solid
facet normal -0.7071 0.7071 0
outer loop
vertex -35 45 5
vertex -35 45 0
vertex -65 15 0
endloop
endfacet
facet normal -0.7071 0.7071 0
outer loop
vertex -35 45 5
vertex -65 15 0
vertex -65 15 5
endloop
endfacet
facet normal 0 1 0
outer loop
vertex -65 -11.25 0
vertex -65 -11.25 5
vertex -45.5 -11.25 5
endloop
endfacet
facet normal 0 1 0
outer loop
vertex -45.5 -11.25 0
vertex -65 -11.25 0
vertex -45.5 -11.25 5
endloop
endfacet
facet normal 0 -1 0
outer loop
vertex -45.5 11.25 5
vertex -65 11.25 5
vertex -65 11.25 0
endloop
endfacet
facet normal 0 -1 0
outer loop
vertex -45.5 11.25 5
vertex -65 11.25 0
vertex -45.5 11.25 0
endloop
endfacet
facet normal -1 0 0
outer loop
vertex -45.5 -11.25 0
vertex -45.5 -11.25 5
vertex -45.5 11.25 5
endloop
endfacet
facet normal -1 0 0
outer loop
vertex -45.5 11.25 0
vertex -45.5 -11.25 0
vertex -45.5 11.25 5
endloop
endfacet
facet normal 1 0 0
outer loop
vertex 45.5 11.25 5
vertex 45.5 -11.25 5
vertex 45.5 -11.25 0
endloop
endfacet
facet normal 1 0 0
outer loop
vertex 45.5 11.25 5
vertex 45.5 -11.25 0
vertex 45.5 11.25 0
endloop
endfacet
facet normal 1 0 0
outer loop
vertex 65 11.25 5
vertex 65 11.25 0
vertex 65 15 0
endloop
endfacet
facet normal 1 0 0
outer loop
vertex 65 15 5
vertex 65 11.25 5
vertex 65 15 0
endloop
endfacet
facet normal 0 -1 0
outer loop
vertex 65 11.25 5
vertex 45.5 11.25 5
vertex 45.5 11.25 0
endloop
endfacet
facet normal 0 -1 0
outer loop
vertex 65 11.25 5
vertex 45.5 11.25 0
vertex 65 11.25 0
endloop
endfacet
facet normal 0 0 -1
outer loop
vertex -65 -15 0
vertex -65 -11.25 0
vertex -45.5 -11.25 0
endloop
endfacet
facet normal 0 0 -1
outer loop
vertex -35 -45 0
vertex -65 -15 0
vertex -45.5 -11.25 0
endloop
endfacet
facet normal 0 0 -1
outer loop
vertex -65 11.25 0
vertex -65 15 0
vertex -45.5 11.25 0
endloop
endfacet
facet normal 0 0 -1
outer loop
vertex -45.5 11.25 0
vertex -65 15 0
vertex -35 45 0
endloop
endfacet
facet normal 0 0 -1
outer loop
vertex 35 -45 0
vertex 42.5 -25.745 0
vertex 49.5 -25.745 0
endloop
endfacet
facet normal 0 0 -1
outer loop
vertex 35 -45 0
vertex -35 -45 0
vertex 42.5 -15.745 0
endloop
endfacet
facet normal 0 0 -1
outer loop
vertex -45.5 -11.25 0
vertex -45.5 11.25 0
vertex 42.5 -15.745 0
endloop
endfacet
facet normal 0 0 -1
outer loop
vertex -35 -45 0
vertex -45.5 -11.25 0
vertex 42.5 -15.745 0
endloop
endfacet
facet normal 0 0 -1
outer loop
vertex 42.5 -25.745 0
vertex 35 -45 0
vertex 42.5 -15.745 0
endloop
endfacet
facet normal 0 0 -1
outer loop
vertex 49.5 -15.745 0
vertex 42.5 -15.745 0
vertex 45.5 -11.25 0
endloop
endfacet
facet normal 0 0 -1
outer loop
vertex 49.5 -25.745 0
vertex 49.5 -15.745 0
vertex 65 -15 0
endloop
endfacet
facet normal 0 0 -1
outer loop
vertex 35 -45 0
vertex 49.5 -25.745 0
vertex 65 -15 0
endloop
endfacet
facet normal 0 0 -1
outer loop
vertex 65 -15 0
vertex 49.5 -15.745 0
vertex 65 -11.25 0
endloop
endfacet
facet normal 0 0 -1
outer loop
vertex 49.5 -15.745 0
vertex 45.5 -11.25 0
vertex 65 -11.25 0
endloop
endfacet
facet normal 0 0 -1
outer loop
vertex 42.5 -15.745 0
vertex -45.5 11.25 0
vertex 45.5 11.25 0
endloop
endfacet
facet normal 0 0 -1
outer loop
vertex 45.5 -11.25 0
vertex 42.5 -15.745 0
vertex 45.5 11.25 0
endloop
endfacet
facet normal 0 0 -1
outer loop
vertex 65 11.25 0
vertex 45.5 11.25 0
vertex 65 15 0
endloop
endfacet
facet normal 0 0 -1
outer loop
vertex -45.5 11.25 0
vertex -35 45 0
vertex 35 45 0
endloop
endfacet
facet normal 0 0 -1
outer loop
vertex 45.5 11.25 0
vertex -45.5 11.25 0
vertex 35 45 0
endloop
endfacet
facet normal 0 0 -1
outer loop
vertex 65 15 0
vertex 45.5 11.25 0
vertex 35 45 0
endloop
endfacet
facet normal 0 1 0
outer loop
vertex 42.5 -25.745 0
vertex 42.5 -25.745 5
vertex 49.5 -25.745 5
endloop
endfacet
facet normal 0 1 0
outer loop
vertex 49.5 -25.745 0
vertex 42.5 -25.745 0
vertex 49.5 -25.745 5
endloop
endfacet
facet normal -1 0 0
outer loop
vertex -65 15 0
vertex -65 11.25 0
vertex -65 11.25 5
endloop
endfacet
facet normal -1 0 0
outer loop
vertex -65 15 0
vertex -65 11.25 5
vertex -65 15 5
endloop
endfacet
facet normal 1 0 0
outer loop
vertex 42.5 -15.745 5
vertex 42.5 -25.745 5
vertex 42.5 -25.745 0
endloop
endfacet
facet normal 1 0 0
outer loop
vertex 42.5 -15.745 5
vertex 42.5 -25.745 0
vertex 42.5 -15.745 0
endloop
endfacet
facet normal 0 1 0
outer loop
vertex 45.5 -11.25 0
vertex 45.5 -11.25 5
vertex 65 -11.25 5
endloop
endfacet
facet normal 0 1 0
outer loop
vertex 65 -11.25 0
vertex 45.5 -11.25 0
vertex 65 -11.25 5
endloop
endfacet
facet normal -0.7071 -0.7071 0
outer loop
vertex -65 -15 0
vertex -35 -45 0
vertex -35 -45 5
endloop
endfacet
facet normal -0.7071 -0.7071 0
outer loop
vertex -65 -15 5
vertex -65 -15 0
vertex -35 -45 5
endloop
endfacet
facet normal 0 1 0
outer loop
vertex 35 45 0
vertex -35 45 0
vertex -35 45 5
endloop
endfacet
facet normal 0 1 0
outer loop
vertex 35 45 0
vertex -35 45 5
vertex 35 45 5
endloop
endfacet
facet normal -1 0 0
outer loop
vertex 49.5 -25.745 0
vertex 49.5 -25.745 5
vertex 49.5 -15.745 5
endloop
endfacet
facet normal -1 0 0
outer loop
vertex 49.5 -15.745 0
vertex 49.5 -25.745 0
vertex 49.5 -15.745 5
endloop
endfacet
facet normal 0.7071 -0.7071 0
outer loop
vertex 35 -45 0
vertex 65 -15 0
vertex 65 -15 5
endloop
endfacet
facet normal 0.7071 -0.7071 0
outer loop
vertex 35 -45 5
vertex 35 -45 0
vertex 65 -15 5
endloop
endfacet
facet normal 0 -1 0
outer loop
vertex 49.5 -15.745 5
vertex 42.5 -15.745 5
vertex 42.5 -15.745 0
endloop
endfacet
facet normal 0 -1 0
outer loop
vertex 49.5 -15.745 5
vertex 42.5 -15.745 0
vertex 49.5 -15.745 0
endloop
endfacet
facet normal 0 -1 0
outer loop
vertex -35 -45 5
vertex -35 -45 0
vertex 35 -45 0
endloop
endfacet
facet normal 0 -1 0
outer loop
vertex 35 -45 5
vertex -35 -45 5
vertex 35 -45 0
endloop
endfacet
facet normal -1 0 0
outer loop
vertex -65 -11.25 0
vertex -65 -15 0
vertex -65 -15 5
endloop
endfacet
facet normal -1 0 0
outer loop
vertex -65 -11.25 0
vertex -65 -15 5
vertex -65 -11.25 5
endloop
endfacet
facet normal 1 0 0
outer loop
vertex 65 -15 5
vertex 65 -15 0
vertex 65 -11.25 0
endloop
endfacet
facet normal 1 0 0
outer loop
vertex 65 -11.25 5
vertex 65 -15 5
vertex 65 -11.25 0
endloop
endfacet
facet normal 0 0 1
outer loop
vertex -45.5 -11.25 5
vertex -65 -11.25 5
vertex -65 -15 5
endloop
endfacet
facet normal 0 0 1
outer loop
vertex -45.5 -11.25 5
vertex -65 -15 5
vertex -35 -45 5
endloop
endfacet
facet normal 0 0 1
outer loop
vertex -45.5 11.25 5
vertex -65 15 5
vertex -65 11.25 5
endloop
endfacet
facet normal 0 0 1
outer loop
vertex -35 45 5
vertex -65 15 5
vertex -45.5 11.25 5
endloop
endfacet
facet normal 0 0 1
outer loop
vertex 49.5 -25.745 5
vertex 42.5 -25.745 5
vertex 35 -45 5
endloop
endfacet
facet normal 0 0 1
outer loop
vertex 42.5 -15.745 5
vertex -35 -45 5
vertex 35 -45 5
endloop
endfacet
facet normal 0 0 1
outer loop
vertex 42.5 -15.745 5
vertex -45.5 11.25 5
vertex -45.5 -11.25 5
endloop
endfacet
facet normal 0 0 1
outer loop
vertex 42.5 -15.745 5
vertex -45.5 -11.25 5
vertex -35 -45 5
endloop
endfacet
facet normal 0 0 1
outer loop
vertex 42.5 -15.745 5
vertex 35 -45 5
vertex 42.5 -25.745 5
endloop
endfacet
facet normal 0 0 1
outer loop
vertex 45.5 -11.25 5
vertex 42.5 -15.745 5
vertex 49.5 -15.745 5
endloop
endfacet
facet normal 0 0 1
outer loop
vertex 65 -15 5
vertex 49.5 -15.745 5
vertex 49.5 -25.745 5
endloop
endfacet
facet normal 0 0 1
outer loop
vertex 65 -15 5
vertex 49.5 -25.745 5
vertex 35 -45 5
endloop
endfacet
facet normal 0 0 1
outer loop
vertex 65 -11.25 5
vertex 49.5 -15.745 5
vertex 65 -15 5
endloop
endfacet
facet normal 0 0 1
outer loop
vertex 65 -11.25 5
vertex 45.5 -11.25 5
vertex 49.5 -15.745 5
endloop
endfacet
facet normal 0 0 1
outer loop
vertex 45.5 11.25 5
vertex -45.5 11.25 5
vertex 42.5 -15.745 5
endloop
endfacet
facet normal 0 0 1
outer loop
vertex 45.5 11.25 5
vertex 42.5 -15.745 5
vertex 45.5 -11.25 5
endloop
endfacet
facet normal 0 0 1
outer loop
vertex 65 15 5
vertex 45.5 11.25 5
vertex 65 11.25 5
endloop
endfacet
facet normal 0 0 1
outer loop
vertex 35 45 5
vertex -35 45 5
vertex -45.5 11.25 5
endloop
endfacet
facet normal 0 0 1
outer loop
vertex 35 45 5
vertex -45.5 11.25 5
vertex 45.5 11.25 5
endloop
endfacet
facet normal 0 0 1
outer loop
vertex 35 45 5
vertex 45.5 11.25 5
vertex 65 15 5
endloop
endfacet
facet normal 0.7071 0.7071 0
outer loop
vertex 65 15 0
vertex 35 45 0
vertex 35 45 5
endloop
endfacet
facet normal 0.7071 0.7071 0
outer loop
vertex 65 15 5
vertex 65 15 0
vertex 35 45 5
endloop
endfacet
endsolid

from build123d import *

# Parameters (mm, degrees)
SKETCH_W        = 130
SKETCH_H        = 90
PAD_DEPTH       = 5
CHAMFER_SIZE    = 30
SKETCH001_W     = 19.5
SKETCH001_H     = 22.5
POCKET_DEPTH    = 5
SKETCH002_W     = 7
SKETCH002_H     = 10
POCKET001_DEPTH = 5


with BuildPart() as part:
    # Sketch → Pad (new body)
    with BuildSketch(Plane.XY):
        Rectangle(SKETCH_W, SKETCH_H)
    extrude(amount=PAD_DEPTH)

    # Chamfer
    chamfer_edges = [part.edges().sort_by_distance(p)[0] for p in [
        (-65, -45, 2.5),
        (65, -45, 2.5),
        (65, 45, 2.5),
        (-65, 45, 2.5),
    ]]
    chamfer(chamfer_edges, length=CHAMFER_SIZE)

    # Sketch001 (on Face5 of Chamfer) → Pocket (cut)
    with BuildSketch(Plane.XY.offset(5)):
        with Locations((55.25, 0)):
            Rectangle(SKETCH001_W, SKETCH001_H)
        with Locations((-55.25, 0)):
            Rectangle(SKETCH001_W, SKETCH001_H)
    extrude(amount=-POCKET_DEPTH, mode=Mode.SUBTRACT)

    # Sketch002 (on Face5 of Pocket) → Pocket001 (cut)
    with BuildSketch(Plane.XY.offset(5)):
        with Locations((46, -20.744505)):
            Rectangle(SKETCH002_W, SKETCH002_H)
    extrude(amount=-POCKET001_DEPTH, mode=Mode.SUBTRACT)


solid = part.part
